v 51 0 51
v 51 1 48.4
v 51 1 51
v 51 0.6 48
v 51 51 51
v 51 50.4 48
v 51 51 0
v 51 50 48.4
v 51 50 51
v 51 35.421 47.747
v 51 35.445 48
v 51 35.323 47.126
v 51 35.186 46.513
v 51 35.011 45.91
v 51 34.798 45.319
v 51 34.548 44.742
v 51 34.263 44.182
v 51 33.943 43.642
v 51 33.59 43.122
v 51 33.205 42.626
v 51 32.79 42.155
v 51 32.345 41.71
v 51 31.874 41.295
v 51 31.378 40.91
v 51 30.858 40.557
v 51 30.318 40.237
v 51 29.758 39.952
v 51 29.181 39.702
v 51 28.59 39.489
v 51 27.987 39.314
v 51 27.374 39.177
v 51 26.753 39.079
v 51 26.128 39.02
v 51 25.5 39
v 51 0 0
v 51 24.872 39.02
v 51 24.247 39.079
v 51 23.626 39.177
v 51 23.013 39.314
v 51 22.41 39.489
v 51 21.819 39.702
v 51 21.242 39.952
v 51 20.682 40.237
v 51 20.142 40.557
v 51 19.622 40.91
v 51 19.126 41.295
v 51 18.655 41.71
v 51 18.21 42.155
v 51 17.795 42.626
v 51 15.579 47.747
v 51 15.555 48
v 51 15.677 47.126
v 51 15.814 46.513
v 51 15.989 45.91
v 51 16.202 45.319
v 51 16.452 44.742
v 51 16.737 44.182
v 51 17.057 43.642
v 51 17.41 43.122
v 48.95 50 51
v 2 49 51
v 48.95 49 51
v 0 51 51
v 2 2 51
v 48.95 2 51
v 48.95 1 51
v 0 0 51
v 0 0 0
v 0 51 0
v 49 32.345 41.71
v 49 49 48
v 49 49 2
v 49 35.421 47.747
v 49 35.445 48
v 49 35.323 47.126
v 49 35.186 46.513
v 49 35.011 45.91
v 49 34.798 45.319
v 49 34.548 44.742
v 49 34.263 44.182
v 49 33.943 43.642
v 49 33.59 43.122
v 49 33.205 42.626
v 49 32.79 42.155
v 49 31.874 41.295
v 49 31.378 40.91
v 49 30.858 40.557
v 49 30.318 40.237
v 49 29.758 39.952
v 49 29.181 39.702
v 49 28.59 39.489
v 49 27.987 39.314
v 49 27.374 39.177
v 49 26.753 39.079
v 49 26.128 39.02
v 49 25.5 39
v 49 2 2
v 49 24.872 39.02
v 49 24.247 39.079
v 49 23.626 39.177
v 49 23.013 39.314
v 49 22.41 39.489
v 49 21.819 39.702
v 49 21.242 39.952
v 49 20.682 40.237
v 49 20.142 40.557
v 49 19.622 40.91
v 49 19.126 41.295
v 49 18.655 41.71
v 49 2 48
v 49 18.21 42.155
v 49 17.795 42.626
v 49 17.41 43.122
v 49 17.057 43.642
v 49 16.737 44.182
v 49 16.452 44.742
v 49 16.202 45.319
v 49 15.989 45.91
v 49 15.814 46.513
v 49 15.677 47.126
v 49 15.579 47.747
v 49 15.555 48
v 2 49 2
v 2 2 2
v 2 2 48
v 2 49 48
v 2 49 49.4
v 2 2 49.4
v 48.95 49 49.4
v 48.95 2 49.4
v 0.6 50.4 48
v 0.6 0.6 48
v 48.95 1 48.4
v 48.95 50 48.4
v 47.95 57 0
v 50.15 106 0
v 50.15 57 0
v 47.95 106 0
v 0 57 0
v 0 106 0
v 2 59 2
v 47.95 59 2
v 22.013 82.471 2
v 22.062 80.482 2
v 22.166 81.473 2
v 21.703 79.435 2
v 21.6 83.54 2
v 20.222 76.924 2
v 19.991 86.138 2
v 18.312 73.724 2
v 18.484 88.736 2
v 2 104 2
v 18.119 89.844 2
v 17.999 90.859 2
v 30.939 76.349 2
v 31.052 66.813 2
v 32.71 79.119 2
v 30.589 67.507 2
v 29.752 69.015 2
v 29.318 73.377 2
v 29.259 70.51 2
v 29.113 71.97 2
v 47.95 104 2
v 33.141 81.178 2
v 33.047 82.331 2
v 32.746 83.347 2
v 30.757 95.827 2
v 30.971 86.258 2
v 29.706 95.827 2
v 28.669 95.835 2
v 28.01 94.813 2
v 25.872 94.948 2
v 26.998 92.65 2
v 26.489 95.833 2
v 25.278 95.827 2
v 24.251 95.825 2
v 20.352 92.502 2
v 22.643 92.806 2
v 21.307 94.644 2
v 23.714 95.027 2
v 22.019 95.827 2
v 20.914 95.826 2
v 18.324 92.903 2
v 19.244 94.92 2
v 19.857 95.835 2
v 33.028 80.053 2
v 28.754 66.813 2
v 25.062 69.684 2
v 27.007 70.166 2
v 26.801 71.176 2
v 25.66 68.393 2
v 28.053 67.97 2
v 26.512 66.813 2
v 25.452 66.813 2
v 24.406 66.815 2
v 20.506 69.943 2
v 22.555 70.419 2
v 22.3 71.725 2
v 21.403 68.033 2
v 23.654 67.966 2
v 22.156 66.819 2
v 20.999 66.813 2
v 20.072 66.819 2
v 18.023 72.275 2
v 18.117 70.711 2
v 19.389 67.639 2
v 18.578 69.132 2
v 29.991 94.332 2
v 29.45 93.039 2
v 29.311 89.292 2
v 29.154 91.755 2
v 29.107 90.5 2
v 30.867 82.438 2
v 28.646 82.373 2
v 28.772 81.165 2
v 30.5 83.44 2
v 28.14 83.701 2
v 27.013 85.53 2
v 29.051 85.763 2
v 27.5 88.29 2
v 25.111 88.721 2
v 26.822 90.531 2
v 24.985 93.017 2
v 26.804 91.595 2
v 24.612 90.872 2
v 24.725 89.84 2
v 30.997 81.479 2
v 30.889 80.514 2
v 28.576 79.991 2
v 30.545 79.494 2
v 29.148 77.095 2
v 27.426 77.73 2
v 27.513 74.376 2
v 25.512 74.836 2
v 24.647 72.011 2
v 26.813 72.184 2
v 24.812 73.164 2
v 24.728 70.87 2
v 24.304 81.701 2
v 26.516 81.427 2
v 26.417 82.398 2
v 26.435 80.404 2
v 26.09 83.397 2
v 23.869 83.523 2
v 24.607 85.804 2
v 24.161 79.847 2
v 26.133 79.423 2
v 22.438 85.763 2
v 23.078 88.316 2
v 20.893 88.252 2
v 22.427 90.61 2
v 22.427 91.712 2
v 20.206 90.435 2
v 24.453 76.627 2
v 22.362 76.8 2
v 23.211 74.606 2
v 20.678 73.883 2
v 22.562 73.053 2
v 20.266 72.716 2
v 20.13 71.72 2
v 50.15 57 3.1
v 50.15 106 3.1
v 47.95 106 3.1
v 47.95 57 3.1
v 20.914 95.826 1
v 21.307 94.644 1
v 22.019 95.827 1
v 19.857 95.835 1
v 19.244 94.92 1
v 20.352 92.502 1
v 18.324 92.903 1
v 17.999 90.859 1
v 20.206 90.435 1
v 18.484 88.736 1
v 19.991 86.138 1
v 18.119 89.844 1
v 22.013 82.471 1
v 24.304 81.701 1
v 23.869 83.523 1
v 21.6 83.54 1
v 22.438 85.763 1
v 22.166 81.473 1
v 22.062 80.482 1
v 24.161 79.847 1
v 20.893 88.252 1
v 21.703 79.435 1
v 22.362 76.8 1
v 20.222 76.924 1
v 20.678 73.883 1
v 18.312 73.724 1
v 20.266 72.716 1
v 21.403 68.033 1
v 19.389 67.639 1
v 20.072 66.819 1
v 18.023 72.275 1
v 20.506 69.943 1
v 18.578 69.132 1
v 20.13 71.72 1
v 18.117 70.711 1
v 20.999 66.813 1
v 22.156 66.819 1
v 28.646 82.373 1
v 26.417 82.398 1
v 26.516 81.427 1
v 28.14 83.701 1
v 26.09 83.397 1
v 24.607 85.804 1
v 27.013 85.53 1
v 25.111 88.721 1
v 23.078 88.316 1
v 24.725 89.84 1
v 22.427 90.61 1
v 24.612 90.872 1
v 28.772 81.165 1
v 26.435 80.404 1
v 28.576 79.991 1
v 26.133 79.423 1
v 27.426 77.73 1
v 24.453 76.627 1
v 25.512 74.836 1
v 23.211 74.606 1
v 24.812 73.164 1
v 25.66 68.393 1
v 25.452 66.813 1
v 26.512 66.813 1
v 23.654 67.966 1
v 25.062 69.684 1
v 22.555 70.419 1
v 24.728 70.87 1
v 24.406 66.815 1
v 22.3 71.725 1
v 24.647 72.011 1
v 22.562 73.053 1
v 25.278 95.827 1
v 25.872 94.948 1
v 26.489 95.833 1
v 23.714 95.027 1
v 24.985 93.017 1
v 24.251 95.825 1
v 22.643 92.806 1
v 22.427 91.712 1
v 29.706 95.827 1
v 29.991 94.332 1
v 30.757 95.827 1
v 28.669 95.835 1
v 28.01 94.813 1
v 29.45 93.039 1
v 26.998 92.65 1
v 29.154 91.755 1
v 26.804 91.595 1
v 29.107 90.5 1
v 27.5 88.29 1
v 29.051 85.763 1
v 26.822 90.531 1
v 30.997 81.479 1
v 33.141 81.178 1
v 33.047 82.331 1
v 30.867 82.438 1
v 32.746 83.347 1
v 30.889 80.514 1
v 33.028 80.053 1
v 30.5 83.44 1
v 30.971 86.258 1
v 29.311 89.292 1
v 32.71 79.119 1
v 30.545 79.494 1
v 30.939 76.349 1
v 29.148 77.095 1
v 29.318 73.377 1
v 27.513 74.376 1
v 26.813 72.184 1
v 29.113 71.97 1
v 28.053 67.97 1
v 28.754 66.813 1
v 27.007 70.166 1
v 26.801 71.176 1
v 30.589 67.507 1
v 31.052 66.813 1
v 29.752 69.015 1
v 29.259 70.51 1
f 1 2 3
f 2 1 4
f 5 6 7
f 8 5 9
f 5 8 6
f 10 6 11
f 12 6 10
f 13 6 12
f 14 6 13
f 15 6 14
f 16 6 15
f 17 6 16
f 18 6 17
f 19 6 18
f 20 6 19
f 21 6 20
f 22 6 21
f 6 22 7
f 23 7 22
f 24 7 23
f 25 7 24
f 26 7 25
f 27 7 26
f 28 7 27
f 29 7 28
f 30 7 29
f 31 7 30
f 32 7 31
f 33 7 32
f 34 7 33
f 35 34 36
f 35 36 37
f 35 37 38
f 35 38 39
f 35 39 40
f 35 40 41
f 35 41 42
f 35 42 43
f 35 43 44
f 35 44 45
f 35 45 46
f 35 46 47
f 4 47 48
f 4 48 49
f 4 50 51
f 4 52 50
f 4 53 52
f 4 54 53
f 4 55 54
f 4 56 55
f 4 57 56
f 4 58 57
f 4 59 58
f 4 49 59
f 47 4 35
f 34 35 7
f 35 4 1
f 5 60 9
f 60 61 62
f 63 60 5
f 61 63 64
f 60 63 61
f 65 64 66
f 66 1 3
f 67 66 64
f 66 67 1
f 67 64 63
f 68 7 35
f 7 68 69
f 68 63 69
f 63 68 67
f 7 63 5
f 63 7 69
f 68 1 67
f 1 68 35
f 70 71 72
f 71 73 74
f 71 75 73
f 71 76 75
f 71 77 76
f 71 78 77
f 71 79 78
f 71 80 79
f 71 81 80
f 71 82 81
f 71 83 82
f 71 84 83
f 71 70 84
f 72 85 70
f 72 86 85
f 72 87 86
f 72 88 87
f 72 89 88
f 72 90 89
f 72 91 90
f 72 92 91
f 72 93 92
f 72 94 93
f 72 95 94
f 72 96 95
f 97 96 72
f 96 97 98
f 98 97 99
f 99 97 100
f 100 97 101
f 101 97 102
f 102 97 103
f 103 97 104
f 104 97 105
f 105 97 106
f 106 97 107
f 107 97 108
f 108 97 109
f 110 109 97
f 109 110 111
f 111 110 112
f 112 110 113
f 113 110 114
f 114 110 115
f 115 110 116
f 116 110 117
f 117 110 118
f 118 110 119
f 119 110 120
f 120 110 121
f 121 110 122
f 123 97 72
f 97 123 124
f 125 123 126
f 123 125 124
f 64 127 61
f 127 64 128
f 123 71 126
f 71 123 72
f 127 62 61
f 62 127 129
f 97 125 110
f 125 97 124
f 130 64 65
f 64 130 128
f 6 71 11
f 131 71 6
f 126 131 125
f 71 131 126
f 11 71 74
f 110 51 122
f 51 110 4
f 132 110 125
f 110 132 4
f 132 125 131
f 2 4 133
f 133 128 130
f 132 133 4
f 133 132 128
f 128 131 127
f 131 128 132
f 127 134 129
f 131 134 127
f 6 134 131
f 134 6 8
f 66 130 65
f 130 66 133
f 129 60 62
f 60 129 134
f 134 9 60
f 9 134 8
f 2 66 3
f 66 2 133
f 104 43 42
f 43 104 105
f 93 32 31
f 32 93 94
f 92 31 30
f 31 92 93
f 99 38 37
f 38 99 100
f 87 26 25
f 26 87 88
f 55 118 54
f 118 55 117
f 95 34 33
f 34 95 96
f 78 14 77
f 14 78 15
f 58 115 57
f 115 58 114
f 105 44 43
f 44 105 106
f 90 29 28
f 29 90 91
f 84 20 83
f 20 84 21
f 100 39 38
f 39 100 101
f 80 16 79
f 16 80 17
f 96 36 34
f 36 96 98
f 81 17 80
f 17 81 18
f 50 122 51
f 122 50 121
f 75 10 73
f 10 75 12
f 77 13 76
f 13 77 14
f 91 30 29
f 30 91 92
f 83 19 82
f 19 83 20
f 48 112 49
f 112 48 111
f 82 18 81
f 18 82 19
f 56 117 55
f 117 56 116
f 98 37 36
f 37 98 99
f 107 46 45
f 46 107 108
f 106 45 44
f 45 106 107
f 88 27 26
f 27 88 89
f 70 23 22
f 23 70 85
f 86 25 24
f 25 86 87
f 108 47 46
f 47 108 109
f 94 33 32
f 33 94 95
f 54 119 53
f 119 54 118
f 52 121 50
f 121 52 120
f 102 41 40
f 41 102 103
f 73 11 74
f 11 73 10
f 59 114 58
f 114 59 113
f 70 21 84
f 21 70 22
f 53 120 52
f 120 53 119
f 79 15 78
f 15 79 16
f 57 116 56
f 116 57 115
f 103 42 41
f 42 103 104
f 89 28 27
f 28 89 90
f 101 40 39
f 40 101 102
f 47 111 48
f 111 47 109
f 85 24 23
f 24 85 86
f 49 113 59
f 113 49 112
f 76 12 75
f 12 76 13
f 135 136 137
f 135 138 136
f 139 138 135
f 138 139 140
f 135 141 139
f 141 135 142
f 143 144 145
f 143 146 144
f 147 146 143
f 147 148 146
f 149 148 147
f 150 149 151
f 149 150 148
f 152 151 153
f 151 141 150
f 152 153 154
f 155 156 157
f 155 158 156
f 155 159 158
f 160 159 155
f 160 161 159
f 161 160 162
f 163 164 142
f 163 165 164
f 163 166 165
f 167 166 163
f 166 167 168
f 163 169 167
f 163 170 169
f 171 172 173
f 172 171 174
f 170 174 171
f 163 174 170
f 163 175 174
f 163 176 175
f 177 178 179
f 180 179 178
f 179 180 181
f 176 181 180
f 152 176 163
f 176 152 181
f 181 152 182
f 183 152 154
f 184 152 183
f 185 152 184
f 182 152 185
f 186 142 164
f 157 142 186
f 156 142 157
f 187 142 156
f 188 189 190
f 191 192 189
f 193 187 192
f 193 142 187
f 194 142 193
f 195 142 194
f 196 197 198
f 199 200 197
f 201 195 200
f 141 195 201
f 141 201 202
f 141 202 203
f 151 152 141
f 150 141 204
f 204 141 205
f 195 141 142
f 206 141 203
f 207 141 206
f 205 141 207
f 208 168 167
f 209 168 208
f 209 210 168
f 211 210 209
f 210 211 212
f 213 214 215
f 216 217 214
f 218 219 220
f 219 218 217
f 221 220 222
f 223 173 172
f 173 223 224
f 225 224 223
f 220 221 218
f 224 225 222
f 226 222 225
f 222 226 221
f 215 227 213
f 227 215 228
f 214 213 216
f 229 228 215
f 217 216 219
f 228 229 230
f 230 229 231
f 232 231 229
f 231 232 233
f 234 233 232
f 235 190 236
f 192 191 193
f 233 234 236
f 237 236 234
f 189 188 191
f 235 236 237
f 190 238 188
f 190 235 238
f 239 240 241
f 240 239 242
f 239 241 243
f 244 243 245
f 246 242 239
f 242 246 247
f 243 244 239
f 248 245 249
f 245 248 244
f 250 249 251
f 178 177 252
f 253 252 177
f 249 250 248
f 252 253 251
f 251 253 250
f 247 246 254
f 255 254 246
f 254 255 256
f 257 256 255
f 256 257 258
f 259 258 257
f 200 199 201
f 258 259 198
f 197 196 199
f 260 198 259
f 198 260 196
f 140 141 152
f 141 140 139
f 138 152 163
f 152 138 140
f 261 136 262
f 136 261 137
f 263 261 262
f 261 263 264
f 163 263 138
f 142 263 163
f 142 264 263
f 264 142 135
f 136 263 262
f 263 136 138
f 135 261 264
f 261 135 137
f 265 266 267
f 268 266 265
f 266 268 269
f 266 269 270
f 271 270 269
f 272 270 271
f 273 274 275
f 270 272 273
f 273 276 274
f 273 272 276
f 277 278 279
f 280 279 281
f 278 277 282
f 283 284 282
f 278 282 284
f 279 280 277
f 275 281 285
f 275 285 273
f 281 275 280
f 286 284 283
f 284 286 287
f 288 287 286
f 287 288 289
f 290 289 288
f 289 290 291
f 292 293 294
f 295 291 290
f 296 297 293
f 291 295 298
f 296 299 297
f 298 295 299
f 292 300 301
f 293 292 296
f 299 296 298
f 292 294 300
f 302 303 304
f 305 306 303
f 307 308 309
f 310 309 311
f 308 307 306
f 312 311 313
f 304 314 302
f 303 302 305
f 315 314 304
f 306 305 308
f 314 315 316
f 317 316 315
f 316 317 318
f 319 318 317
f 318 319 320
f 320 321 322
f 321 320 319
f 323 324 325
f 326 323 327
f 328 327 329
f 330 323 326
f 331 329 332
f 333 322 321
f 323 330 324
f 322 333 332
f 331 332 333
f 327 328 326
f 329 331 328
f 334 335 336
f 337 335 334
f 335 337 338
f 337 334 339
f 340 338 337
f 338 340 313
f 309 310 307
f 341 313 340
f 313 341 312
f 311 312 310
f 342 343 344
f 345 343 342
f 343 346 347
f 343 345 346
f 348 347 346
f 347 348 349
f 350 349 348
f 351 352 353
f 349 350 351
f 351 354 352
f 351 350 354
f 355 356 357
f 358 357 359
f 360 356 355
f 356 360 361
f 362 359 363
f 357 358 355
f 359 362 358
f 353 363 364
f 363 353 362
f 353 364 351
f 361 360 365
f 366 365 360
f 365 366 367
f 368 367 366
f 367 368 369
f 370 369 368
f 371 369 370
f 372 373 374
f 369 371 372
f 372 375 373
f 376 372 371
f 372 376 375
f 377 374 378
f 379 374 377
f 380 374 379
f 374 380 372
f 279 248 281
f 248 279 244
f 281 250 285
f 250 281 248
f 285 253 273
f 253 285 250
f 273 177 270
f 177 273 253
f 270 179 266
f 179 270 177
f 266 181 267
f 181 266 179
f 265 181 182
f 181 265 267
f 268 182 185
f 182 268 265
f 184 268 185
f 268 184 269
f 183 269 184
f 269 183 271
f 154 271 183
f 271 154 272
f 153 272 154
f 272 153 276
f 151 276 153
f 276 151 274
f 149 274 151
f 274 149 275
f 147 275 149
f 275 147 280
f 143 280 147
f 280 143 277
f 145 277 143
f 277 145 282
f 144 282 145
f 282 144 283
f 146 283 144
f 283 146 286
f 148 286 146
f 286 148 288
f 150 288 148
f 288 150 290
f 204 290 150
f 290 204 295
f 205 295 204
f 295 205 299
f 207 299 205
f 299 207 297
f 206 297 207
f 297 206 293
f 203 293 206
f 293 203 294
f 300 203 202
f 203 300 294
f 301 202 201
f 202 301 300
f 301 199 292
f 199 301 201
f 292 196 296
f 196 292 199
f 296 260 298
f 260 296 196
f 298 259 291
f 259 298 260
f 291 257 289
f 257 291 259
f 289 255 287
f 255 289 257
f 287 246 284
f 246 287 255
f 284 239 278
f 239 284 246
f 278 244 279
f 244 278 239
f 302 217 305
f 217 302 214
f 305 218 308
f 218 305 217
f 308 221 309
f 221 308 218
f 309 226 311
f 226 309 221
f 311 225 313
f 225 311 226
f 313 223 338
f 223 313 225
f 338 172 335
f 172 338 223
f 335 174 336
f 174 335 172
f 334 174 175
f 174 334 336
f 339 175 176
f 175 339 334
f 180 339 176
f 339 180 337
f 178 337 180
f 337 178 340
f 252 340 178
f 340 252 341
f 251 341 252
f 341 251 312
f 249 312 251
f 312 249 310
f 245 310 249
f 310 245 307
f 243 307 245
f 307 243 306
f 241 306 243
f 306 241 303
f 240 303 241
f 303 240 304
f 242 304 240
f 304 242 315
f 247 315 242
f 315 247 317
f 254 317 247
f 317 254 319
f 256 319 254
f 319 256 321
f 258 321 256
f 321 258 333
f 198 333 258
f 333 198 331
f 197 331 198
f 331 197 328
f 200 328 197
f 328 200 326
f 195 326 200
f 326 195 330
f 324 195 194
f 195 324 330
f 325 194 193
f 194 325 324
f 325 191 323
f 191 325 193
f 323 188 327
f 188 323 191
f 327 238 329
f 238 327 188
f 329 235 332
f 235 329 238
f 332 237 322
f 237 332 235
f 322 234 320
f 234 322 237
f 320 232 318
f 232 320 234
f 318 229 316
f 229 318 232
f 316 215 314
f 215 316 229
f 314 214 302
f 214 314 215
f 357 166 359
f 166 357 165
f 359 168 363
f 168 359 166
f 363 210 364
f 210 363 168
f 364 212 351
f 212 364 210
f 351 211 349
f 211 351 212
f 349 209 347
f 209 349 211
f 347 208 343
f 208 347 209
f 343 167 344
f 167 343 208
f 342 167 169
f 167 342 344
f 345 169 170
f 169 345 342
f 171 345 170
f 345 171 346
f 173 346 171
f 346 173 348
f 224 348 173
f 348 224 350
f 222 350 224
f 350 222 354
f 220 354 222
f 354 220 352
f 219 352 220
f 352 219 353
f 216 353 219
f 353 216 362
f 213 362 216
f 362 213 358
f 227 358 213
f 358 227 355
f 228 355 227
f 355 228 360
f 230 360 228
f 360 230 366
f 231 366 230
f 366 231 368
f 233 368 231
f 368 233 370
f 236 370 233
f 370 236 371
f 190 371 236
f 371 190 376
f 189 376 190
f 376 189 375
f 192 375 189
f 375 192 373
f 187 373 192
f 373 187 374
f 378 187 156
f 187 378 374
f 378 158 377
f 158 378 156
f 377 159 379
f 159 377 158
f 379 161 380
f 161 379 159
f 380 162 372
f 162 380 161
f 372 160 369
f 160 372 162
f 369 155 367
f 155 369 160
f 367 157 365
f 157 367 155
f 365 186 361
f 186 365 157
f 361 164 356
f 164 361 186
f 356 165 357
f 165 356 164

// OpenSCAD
// file: carcassonne_box.scad
/**
 * @file carcassonne_box.scad
 * @author Conlan Wesson
 * Template for Carcossonne boxes.
 * @copyright Creative Commons Attribution-NonCommercial-ShareAlike 4.0
 */

mm = 1;
cm = 10*mm;

width = 47*mm;
thick = 2.5*mm;
wall = 2*mm;

/**
 * Lid for box.
 * @param count Number of cards.
 * @param columns Number of columns.
 * @param icon Path to icon DXF file.
 * @param rot Icon rotation in degrees.
 * @param mult Icon scale.
 * @param xoff X-offset of icon from center.
 * @param yoff Y-offset of icon from center.
 */
module carcassonne_lid(count, columns=1, icon=false, rot=0, mult=1, xoff=0, yoff=0, g=0){
	length = (thick * count) + ((width/2) - ((thick * count) % (width/2)));
	w = length+(1.5*wall)+.1;
	l = (width*columns)+wall;
	h = wall;
	d = 2;

	CubePoints = [
		[ 0-g, 0-g,   0 ],  //0
		[ w+g, 0-g,   0 ],  //1
		[ w+g, l+g,   0 ],  //2
		[ 0-g, l+g,   0 ],  //3
		[   d,   d, h+g ],  //4
		[   w,   d, h+g ],  //5
		[   w, l-d, h+g ],  //6
		[   d, l-d, h+g ]   //7
	];
	
	CubeFaces = [
		[0,1,2,3],  // bottom
		[4,5,1,0],  // front
		[7,6,5,4],  // top
		[5,6,2,1],  // right
		[6,7,3,2],  // back
		[7,4,0,3]   // left
	];
	
	
	difference(){
		union(){
			polyhedron( CubePoints, CubeFaces );
			translate([w-wall-.15,0,0]) cube([wall+.2,l, (1.5*wall)+.1]);
		}
		if(icon){
			translate([w/2+xoff,l/3+yoff,h-(wall/2)]){
				linear_extrude(height=(wall)+.1){
					rotate(rot) scale(mult) import(icon);
				}
			}
		}
	}
}

/**
 * Carcassonne card box.
 * @param count Number of cards.
 * @param dividers Array of divider positions.
 * @param columns Number of columns.
 */
module carcassonne_box(count, dividers=[], columns=1){
	length = (thick * count) + ((width/2) - ((thick * count) % (width/2)));
	difference(){
		union(){
			difference(){
				// Outer walls
				cube([length+(2*wall), (width*columns)+(2*wall), width+(2*wall)]);
				// Cavity
				translate([wall, wall, wall]){
					cube([length, width*columns, (width+wall)+.1]);
				}
			}
			// Dividers
			for(col = [0:columns-1]){
				for(div = dividers[col]){
					translate([(div*(width/2))+(wall/2), width*col+wall, 0]) cube([wall/2, width, width-(2*wall)]);
				}
				if(col > 0){
					translate([0, width*col+(wall/2), 0]) cube([length+(2*wall), wall/2, width-(2*wall)]);
				}
			}
		}
		union(){
			// Notch
			for(col = [0:columns-1]){
				translate([wall, wall+(width*col), wall]){
					translate([0, width/2, width])
					rotate([0, 90, 0]){
						cylinder(r=10, h=length+(2*wall), $fn=100);
					}
				}
			}
			// Track
			translate([wall/2,wall/2,width+wall/2]) carcassonne_lid(count, columns, g=0.4);
		}
	}
}
// main file
/**
 * @file river.scad
 * @author Conlan Wesson
 * The River Carcossonne box.
 * @copyright Creative Commons Attribution-NonCommercial-ShareAlike 4.0
 */

include <carcassonne_box.scad>

count = 12;
dividers = [[]];
columns = 1;

carcassonne_box(count, dividers, columns);
translate([0,width*columns+10,0]) carcassonne_lid(count, columns, icon="river.dxf", rot=90, mult=0.2, xoff=13, yoff=-11);
